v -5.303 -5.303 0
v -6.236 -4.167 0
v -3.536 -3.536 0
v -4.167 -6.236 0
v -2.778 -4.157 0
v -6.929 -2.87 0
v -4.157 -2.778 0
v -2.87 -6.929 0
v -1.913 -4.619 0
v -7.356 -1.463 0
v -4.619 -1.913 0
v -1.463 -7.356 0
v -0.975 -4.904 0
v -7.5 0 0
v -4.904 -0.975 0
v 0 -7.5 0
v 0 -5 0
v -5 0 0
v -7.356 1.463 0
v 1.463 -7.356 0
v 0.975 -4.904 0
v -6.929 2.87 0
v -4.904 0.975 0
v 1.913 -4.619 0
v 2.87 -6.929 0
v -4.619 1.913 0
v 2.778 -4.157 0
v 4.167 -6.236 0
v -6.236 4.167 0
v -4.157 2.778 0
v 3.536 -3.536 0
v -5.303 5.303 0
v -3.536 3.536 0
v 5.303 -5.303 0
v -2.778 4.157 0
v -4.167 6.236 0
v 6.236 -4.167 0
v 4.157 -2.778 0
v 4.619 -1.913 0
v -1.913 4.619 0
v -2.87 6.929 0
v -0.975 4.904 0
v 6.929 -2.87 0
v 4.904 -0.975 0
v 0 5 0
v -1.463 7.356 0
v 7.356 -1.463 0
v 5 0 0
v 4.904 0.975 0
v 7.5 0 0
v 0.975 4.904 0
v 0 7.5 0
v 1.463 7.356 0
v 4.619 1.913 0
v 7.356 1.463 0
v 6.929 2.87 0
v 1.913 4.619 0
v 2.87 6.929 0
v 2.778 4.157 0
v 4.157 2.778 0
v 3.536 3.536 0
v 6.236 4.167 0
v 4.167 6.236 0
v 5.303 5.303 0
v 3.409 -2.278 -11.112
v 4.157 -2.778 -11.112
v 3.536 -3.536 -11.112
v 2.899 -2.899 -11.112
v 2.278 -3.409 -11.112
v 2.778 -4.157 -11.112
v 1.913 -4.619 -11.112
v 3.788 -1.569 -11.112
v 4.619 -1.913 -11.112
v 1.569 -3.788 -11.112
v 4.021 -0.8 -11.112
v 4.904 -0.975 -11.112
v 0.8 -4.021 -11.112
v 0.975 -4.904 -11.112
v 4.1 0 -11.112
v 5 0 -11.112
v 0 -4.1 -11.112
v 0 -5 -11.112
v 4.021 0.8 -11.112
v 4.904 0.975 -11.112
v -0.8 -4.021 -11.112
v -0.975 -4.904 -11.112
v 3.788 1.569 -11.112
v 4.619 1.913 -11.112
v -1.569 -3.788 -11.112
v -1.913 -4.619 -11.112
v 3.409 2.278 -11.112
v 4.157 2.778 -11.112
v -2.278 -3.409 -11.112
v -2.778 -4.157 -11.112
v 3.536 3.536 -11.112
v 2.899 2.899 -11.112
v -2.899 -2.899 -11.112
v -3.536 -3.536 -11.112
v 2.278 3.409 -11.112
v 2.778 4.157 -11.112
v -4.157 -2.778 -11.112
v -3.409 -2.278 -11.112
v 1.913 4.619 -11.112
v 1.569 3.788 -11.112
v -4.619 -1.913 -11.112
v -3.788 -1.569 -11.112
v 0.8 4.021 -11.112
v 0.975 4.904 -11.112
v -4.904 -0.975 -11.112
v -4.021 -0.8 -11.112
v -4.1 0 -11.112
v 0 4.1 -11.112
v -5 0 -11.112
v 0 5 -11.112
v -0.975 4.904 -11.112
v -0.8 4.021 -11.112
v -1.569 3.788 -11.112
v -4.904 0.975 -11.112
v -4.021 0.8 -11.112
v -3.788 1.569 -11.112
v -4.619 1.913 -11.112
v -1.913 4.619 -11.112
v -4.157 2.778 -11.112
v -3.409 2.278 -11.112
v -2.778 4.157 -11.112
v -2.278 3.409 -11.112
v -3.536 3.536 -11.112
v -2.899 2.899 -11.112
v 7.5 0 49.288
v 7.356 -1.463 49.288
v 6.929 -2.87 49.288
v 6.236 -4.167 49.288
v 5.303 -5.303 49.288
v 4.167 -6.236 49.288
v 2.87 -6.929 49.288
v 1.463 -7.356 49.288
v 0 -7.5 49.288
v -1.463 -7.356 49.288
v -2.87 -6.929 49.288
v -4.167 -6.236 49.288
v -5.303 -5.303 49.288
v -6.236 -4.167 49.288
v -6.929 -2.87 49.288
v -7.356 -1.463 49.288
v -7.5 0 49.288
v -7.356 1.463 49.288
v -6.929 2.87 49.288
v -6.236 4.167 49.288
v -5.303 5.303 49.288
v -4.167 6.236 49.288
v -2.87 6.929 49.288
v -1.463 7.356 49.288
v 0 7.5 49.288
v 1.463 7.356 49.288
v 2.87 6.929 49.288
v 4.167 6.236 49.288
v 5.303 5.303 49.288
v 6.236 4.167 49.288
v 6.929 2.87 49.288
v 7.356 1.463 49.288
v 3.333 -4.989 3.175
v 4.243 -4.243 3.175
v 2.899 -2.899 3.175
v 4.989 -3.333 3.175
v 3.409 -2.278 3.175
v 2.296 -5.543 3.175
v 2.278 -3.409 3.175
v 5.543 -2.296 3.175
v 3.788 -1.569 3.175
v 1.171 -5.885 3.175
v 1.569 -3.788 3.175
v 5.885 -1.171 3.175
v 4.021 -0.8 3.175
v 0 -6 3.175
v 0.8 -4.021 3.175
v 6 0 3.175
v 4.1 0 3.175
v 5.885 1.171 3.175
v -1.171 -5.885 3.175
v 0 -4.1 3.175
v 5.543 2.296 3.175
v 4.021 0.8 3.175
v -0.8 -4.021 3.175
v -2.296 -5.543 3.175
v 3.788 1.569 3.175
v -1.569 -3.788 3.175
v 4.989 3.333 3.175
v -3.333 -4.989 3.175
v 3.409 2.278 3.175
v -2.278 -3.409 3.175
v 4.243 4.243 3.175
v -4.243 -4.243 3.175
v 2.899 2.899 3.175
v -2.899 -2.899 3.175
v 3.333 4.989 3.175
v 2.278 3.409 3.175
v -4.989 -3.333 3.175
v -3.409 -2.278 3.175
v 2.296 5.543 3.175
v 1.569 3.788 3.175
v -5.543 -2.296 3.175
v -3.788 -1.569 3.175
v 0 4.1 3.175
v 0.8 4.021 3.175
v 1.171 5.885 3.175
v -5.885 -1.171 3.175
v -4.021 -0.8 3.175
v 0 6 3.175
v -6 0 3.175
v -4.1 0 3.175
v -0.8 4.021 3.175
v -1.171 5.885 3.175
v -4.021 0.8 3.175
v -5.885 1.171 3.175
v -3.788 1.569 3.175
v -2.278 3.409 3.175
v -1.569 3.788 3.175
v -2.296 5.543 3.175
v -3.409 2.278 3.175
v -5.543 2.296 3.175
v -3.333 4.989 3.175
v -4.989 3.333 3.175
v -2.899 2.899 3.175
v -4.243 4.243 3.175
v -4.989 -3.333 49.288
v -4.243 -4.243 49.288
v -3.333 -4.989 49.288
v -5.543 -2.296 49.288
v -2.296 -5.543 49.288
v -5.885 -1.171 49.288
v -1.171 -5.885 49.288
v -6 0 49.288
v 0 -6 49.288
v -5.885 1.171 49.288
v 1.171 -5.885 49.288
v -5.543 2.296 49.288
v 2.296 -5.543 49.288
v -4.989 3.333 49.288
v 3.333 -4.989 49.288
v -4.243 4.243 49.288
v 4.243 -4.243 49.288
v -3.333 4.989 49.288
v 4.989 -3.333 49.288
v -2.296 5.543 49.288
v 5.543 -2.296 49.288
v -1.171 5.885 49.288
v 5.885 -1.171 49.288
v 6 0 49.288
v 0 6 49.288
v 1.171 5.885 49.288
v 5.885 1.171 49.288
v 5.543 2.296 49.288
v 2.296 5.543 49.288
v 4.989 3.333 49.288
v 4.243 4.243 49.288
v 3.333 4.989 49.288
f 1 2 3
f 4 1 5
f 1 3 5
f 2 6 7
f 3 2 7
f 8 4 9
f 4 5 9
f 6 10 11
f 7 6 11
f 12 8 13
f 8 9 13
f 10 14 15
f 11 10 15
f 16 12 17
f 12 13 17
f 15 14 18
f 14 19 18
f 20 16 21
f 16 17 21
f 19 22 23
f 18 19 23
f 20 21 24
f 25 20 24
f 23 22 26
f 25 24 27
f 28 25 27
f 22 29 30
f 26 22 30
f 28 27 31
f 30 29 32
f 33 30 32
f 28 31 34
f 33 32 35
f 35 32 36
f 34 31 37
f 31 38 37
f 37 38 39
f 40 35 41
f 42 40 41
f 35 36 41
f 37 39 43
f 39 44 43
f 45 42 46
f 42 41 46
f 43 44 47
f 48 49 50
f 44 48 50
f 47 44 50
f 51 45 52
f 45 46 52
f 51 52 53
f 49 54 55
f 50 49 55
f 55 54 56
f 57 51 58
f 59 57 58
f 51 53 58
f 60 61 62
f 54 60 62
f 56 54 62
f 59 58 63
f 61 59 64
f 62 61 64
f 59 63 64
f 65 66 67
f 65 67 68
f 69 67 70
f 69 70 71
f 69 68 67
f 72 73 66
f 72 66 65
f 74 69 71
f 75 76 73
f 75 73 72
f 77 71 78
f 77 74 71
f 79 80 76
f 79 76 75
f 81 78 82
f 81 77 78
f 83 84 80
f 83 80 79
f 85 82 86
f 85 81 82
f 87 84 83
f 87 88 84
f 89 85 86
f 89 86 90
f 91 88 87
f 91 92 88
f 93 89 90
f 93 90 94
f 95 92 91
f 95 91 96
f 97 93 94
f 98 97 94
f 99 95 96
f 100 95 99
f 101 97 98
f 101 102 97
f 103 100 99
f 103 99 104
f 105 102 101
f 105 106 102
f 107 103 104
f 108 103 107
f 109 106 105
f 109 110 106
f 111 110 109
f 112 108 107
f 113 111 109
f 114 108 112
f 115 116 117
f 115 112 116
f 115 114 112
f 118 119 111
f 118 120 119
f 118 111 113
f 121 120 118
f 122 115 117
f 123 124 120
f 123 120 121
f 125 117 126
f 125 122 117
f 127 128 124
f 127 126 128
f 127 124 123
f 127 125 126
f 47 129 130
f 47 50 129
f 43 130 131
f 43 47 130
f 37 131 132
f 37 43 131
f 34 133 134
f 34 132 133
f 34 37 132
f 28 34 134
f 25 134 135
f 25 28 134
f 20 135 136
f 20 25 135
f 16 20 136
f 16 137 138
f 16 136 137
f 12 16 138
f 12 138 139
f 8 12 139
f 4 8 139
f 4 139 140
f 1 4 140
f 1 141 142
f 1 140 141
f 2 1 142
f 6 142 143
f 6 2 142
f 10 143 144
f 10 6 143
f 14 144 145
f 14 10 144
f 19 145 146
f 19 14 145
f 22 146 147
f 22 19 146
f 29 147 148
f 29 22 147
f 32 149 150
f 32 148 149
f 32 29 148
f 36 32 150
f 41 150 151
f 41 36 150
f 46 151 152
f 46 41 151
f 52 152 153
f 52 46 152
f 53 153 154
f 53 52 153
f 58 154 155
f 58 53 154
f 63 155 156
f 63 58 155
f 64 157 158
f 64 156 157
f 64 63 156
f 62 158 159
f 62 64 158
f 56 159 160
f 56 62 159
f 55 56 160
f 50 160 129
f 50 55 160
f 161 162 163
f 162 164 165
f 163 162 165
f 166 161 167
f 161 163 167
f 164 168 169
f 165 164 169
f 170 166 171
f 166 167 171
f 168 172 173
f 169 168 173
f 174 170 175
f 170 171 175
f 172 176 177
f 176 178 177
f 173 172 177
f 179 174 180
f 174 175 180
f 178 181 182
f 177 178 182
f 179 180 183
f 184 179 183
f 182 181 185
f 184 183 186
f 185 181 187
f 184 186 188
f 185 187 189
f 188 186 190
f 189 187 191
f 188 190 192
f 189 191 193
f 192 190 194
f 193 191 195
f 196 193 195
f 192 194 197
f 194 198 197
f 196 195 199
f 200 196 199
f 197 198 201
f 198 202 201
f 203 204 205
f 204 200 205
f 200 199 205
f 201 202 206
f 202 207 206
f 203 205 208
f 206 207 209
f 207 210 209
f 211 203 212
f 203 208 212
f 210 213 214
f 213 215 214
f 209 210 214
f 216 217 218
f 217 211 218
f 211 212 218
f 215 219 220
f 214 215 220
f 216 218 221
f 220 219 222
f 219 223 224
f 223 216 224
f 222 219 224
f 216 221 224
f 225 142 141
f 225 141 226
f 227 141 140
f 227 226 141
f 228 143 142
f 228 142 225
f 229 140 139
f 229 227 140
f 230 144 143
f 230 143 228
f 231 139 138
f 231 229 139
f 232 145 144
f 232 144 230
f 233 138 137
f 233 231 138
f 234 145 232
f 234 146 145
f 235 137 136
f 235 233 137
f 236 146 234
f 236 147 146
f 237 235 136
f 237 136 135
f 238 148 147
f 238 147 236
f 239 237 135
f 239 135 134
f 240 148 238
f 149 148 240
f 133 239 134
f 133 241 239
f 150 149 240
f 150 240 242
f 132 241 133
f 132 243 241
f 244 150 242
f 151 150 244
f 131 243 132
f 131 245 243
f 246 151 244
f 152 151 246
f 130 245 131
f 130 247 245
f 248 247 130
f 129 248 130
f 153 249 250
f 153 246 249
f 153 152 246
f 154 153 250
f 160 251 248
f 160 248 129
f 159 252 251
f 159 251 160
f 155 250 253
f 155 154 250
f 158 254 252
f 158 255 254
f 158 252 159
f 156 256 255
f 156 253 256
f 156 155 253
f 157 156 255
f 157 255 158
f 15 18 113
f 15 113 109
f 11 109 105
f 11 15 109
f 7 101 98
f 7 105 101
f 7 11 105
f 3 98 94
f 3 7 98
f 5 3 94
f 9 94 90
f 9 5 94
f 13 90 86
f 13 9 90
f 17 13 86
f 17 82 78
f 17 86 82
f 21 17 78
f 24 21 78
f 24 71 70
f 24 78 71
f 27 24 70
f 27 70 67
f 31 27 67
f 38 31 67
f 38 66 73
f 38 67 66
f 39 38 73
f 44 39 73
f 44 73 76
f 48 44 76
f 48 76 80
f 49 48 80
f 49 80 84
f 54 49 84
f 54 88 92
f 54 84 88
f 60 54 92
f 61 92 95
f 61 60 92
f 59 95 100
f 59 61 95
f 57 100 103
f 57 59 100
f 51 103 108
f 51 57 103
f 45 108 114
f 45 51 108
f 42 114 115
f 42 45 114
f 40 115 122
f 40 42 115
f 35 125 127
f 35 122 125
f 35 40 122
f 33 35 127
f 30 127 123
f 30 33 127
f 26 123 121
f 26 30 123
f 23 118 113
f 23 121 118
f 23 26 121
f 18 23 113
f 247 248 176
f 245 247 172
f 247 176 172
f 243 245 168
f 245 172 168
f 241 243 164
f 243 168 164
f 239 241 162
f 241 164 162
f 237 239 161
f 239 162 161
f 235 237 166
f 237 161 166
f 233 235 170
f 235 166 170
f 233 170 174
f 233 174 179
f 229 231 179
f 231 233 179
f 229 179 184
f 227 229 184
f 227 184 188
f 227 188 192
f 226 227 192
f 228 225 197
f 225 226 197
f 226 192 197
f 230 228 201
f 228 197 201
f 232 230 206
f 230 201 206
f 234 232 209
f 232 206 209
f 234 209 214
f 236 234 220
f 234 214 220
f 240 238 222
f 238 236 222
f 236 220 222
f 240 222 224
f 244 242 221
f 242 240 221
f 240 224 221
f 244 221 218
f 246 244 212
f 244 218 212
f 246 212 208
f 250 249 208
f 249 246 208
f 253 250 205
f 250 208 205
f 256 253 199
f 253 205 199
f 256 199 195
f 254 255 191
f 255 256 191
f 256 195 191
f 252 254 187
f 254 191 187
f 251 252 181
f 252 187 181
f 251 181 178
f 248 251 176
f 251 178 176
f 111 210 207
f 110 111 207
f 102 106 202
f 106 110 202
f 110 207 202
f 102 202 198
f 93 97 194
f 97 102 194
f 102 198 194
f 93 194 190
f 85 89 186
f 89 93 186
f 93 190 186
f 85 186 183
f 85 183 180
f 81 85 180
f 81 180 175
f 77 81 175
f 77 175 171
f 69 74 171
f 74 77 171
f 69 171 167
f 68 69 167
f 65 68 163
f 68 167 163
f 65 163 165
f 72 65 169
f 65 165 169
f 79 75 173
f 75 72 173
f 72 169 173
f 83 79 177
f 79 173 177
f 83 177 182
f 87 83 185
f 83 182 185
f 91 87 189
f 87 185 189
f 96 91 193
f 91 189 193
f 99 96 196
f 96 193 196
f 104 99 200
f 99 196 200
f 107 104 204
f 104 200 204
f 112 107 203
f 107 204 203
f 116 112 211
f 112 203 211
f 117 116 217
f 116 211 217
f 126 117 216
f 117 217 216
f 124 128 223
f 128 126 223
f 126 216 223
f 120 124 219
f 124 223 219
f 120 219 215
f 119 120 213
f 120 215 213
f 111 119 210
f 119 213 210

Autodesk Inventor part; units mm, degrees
ref_plane "YZ Plane" through (0, 0, 0) normal (1, 0, 0) x (0, 1, 0)
ref_plane "XZ Plane" through (0, 0, 0) normal (0, 1, 0) x (-1, 0, 0)
ref_plane "XY Plane" through (0, 0, 0) normal (0, 0, 1) x (1, 0, 0)
sketch "Sketch1" plane through (0, 0, 0) normal (0, 0, 1) x (1, 0, 0)
  circle A0 centre (0, 0) radius 6
  circle A1 centre (0, 0) radius 7.5
  dimension "d0" = 12
  dimension "d1" = 15
extrude "Extrusion1" add sketch "Sketch1" along normal blind 49.288
sketch "Sketch2" plane through (0, 0, 0) normal (0, 0, -1) x (-1, 0, 0)
  circle A0 centre (0, 0) radius 4.1
  circle A1 centre (0, 0) radius 5
  dimension "d4" = 8.2
  dimension "d5" = 10
extrude "Extrusion2" add sketch "Sketch2" along normal blind 11.1125
sketch "Sketch3" plane through (0, 0, 0) normal (0, 0, -1) x (-1, 0, 0)
  circle A0 centre (0, 0) radius 4.1 projected
  circle A1 centre (0, 0) radius 7.5 projected
extrude "Extrusion3" add sketch "Sketch3" against normal blind 3.175
properties part number "OuterShaft" material "Steel, Alloy"
